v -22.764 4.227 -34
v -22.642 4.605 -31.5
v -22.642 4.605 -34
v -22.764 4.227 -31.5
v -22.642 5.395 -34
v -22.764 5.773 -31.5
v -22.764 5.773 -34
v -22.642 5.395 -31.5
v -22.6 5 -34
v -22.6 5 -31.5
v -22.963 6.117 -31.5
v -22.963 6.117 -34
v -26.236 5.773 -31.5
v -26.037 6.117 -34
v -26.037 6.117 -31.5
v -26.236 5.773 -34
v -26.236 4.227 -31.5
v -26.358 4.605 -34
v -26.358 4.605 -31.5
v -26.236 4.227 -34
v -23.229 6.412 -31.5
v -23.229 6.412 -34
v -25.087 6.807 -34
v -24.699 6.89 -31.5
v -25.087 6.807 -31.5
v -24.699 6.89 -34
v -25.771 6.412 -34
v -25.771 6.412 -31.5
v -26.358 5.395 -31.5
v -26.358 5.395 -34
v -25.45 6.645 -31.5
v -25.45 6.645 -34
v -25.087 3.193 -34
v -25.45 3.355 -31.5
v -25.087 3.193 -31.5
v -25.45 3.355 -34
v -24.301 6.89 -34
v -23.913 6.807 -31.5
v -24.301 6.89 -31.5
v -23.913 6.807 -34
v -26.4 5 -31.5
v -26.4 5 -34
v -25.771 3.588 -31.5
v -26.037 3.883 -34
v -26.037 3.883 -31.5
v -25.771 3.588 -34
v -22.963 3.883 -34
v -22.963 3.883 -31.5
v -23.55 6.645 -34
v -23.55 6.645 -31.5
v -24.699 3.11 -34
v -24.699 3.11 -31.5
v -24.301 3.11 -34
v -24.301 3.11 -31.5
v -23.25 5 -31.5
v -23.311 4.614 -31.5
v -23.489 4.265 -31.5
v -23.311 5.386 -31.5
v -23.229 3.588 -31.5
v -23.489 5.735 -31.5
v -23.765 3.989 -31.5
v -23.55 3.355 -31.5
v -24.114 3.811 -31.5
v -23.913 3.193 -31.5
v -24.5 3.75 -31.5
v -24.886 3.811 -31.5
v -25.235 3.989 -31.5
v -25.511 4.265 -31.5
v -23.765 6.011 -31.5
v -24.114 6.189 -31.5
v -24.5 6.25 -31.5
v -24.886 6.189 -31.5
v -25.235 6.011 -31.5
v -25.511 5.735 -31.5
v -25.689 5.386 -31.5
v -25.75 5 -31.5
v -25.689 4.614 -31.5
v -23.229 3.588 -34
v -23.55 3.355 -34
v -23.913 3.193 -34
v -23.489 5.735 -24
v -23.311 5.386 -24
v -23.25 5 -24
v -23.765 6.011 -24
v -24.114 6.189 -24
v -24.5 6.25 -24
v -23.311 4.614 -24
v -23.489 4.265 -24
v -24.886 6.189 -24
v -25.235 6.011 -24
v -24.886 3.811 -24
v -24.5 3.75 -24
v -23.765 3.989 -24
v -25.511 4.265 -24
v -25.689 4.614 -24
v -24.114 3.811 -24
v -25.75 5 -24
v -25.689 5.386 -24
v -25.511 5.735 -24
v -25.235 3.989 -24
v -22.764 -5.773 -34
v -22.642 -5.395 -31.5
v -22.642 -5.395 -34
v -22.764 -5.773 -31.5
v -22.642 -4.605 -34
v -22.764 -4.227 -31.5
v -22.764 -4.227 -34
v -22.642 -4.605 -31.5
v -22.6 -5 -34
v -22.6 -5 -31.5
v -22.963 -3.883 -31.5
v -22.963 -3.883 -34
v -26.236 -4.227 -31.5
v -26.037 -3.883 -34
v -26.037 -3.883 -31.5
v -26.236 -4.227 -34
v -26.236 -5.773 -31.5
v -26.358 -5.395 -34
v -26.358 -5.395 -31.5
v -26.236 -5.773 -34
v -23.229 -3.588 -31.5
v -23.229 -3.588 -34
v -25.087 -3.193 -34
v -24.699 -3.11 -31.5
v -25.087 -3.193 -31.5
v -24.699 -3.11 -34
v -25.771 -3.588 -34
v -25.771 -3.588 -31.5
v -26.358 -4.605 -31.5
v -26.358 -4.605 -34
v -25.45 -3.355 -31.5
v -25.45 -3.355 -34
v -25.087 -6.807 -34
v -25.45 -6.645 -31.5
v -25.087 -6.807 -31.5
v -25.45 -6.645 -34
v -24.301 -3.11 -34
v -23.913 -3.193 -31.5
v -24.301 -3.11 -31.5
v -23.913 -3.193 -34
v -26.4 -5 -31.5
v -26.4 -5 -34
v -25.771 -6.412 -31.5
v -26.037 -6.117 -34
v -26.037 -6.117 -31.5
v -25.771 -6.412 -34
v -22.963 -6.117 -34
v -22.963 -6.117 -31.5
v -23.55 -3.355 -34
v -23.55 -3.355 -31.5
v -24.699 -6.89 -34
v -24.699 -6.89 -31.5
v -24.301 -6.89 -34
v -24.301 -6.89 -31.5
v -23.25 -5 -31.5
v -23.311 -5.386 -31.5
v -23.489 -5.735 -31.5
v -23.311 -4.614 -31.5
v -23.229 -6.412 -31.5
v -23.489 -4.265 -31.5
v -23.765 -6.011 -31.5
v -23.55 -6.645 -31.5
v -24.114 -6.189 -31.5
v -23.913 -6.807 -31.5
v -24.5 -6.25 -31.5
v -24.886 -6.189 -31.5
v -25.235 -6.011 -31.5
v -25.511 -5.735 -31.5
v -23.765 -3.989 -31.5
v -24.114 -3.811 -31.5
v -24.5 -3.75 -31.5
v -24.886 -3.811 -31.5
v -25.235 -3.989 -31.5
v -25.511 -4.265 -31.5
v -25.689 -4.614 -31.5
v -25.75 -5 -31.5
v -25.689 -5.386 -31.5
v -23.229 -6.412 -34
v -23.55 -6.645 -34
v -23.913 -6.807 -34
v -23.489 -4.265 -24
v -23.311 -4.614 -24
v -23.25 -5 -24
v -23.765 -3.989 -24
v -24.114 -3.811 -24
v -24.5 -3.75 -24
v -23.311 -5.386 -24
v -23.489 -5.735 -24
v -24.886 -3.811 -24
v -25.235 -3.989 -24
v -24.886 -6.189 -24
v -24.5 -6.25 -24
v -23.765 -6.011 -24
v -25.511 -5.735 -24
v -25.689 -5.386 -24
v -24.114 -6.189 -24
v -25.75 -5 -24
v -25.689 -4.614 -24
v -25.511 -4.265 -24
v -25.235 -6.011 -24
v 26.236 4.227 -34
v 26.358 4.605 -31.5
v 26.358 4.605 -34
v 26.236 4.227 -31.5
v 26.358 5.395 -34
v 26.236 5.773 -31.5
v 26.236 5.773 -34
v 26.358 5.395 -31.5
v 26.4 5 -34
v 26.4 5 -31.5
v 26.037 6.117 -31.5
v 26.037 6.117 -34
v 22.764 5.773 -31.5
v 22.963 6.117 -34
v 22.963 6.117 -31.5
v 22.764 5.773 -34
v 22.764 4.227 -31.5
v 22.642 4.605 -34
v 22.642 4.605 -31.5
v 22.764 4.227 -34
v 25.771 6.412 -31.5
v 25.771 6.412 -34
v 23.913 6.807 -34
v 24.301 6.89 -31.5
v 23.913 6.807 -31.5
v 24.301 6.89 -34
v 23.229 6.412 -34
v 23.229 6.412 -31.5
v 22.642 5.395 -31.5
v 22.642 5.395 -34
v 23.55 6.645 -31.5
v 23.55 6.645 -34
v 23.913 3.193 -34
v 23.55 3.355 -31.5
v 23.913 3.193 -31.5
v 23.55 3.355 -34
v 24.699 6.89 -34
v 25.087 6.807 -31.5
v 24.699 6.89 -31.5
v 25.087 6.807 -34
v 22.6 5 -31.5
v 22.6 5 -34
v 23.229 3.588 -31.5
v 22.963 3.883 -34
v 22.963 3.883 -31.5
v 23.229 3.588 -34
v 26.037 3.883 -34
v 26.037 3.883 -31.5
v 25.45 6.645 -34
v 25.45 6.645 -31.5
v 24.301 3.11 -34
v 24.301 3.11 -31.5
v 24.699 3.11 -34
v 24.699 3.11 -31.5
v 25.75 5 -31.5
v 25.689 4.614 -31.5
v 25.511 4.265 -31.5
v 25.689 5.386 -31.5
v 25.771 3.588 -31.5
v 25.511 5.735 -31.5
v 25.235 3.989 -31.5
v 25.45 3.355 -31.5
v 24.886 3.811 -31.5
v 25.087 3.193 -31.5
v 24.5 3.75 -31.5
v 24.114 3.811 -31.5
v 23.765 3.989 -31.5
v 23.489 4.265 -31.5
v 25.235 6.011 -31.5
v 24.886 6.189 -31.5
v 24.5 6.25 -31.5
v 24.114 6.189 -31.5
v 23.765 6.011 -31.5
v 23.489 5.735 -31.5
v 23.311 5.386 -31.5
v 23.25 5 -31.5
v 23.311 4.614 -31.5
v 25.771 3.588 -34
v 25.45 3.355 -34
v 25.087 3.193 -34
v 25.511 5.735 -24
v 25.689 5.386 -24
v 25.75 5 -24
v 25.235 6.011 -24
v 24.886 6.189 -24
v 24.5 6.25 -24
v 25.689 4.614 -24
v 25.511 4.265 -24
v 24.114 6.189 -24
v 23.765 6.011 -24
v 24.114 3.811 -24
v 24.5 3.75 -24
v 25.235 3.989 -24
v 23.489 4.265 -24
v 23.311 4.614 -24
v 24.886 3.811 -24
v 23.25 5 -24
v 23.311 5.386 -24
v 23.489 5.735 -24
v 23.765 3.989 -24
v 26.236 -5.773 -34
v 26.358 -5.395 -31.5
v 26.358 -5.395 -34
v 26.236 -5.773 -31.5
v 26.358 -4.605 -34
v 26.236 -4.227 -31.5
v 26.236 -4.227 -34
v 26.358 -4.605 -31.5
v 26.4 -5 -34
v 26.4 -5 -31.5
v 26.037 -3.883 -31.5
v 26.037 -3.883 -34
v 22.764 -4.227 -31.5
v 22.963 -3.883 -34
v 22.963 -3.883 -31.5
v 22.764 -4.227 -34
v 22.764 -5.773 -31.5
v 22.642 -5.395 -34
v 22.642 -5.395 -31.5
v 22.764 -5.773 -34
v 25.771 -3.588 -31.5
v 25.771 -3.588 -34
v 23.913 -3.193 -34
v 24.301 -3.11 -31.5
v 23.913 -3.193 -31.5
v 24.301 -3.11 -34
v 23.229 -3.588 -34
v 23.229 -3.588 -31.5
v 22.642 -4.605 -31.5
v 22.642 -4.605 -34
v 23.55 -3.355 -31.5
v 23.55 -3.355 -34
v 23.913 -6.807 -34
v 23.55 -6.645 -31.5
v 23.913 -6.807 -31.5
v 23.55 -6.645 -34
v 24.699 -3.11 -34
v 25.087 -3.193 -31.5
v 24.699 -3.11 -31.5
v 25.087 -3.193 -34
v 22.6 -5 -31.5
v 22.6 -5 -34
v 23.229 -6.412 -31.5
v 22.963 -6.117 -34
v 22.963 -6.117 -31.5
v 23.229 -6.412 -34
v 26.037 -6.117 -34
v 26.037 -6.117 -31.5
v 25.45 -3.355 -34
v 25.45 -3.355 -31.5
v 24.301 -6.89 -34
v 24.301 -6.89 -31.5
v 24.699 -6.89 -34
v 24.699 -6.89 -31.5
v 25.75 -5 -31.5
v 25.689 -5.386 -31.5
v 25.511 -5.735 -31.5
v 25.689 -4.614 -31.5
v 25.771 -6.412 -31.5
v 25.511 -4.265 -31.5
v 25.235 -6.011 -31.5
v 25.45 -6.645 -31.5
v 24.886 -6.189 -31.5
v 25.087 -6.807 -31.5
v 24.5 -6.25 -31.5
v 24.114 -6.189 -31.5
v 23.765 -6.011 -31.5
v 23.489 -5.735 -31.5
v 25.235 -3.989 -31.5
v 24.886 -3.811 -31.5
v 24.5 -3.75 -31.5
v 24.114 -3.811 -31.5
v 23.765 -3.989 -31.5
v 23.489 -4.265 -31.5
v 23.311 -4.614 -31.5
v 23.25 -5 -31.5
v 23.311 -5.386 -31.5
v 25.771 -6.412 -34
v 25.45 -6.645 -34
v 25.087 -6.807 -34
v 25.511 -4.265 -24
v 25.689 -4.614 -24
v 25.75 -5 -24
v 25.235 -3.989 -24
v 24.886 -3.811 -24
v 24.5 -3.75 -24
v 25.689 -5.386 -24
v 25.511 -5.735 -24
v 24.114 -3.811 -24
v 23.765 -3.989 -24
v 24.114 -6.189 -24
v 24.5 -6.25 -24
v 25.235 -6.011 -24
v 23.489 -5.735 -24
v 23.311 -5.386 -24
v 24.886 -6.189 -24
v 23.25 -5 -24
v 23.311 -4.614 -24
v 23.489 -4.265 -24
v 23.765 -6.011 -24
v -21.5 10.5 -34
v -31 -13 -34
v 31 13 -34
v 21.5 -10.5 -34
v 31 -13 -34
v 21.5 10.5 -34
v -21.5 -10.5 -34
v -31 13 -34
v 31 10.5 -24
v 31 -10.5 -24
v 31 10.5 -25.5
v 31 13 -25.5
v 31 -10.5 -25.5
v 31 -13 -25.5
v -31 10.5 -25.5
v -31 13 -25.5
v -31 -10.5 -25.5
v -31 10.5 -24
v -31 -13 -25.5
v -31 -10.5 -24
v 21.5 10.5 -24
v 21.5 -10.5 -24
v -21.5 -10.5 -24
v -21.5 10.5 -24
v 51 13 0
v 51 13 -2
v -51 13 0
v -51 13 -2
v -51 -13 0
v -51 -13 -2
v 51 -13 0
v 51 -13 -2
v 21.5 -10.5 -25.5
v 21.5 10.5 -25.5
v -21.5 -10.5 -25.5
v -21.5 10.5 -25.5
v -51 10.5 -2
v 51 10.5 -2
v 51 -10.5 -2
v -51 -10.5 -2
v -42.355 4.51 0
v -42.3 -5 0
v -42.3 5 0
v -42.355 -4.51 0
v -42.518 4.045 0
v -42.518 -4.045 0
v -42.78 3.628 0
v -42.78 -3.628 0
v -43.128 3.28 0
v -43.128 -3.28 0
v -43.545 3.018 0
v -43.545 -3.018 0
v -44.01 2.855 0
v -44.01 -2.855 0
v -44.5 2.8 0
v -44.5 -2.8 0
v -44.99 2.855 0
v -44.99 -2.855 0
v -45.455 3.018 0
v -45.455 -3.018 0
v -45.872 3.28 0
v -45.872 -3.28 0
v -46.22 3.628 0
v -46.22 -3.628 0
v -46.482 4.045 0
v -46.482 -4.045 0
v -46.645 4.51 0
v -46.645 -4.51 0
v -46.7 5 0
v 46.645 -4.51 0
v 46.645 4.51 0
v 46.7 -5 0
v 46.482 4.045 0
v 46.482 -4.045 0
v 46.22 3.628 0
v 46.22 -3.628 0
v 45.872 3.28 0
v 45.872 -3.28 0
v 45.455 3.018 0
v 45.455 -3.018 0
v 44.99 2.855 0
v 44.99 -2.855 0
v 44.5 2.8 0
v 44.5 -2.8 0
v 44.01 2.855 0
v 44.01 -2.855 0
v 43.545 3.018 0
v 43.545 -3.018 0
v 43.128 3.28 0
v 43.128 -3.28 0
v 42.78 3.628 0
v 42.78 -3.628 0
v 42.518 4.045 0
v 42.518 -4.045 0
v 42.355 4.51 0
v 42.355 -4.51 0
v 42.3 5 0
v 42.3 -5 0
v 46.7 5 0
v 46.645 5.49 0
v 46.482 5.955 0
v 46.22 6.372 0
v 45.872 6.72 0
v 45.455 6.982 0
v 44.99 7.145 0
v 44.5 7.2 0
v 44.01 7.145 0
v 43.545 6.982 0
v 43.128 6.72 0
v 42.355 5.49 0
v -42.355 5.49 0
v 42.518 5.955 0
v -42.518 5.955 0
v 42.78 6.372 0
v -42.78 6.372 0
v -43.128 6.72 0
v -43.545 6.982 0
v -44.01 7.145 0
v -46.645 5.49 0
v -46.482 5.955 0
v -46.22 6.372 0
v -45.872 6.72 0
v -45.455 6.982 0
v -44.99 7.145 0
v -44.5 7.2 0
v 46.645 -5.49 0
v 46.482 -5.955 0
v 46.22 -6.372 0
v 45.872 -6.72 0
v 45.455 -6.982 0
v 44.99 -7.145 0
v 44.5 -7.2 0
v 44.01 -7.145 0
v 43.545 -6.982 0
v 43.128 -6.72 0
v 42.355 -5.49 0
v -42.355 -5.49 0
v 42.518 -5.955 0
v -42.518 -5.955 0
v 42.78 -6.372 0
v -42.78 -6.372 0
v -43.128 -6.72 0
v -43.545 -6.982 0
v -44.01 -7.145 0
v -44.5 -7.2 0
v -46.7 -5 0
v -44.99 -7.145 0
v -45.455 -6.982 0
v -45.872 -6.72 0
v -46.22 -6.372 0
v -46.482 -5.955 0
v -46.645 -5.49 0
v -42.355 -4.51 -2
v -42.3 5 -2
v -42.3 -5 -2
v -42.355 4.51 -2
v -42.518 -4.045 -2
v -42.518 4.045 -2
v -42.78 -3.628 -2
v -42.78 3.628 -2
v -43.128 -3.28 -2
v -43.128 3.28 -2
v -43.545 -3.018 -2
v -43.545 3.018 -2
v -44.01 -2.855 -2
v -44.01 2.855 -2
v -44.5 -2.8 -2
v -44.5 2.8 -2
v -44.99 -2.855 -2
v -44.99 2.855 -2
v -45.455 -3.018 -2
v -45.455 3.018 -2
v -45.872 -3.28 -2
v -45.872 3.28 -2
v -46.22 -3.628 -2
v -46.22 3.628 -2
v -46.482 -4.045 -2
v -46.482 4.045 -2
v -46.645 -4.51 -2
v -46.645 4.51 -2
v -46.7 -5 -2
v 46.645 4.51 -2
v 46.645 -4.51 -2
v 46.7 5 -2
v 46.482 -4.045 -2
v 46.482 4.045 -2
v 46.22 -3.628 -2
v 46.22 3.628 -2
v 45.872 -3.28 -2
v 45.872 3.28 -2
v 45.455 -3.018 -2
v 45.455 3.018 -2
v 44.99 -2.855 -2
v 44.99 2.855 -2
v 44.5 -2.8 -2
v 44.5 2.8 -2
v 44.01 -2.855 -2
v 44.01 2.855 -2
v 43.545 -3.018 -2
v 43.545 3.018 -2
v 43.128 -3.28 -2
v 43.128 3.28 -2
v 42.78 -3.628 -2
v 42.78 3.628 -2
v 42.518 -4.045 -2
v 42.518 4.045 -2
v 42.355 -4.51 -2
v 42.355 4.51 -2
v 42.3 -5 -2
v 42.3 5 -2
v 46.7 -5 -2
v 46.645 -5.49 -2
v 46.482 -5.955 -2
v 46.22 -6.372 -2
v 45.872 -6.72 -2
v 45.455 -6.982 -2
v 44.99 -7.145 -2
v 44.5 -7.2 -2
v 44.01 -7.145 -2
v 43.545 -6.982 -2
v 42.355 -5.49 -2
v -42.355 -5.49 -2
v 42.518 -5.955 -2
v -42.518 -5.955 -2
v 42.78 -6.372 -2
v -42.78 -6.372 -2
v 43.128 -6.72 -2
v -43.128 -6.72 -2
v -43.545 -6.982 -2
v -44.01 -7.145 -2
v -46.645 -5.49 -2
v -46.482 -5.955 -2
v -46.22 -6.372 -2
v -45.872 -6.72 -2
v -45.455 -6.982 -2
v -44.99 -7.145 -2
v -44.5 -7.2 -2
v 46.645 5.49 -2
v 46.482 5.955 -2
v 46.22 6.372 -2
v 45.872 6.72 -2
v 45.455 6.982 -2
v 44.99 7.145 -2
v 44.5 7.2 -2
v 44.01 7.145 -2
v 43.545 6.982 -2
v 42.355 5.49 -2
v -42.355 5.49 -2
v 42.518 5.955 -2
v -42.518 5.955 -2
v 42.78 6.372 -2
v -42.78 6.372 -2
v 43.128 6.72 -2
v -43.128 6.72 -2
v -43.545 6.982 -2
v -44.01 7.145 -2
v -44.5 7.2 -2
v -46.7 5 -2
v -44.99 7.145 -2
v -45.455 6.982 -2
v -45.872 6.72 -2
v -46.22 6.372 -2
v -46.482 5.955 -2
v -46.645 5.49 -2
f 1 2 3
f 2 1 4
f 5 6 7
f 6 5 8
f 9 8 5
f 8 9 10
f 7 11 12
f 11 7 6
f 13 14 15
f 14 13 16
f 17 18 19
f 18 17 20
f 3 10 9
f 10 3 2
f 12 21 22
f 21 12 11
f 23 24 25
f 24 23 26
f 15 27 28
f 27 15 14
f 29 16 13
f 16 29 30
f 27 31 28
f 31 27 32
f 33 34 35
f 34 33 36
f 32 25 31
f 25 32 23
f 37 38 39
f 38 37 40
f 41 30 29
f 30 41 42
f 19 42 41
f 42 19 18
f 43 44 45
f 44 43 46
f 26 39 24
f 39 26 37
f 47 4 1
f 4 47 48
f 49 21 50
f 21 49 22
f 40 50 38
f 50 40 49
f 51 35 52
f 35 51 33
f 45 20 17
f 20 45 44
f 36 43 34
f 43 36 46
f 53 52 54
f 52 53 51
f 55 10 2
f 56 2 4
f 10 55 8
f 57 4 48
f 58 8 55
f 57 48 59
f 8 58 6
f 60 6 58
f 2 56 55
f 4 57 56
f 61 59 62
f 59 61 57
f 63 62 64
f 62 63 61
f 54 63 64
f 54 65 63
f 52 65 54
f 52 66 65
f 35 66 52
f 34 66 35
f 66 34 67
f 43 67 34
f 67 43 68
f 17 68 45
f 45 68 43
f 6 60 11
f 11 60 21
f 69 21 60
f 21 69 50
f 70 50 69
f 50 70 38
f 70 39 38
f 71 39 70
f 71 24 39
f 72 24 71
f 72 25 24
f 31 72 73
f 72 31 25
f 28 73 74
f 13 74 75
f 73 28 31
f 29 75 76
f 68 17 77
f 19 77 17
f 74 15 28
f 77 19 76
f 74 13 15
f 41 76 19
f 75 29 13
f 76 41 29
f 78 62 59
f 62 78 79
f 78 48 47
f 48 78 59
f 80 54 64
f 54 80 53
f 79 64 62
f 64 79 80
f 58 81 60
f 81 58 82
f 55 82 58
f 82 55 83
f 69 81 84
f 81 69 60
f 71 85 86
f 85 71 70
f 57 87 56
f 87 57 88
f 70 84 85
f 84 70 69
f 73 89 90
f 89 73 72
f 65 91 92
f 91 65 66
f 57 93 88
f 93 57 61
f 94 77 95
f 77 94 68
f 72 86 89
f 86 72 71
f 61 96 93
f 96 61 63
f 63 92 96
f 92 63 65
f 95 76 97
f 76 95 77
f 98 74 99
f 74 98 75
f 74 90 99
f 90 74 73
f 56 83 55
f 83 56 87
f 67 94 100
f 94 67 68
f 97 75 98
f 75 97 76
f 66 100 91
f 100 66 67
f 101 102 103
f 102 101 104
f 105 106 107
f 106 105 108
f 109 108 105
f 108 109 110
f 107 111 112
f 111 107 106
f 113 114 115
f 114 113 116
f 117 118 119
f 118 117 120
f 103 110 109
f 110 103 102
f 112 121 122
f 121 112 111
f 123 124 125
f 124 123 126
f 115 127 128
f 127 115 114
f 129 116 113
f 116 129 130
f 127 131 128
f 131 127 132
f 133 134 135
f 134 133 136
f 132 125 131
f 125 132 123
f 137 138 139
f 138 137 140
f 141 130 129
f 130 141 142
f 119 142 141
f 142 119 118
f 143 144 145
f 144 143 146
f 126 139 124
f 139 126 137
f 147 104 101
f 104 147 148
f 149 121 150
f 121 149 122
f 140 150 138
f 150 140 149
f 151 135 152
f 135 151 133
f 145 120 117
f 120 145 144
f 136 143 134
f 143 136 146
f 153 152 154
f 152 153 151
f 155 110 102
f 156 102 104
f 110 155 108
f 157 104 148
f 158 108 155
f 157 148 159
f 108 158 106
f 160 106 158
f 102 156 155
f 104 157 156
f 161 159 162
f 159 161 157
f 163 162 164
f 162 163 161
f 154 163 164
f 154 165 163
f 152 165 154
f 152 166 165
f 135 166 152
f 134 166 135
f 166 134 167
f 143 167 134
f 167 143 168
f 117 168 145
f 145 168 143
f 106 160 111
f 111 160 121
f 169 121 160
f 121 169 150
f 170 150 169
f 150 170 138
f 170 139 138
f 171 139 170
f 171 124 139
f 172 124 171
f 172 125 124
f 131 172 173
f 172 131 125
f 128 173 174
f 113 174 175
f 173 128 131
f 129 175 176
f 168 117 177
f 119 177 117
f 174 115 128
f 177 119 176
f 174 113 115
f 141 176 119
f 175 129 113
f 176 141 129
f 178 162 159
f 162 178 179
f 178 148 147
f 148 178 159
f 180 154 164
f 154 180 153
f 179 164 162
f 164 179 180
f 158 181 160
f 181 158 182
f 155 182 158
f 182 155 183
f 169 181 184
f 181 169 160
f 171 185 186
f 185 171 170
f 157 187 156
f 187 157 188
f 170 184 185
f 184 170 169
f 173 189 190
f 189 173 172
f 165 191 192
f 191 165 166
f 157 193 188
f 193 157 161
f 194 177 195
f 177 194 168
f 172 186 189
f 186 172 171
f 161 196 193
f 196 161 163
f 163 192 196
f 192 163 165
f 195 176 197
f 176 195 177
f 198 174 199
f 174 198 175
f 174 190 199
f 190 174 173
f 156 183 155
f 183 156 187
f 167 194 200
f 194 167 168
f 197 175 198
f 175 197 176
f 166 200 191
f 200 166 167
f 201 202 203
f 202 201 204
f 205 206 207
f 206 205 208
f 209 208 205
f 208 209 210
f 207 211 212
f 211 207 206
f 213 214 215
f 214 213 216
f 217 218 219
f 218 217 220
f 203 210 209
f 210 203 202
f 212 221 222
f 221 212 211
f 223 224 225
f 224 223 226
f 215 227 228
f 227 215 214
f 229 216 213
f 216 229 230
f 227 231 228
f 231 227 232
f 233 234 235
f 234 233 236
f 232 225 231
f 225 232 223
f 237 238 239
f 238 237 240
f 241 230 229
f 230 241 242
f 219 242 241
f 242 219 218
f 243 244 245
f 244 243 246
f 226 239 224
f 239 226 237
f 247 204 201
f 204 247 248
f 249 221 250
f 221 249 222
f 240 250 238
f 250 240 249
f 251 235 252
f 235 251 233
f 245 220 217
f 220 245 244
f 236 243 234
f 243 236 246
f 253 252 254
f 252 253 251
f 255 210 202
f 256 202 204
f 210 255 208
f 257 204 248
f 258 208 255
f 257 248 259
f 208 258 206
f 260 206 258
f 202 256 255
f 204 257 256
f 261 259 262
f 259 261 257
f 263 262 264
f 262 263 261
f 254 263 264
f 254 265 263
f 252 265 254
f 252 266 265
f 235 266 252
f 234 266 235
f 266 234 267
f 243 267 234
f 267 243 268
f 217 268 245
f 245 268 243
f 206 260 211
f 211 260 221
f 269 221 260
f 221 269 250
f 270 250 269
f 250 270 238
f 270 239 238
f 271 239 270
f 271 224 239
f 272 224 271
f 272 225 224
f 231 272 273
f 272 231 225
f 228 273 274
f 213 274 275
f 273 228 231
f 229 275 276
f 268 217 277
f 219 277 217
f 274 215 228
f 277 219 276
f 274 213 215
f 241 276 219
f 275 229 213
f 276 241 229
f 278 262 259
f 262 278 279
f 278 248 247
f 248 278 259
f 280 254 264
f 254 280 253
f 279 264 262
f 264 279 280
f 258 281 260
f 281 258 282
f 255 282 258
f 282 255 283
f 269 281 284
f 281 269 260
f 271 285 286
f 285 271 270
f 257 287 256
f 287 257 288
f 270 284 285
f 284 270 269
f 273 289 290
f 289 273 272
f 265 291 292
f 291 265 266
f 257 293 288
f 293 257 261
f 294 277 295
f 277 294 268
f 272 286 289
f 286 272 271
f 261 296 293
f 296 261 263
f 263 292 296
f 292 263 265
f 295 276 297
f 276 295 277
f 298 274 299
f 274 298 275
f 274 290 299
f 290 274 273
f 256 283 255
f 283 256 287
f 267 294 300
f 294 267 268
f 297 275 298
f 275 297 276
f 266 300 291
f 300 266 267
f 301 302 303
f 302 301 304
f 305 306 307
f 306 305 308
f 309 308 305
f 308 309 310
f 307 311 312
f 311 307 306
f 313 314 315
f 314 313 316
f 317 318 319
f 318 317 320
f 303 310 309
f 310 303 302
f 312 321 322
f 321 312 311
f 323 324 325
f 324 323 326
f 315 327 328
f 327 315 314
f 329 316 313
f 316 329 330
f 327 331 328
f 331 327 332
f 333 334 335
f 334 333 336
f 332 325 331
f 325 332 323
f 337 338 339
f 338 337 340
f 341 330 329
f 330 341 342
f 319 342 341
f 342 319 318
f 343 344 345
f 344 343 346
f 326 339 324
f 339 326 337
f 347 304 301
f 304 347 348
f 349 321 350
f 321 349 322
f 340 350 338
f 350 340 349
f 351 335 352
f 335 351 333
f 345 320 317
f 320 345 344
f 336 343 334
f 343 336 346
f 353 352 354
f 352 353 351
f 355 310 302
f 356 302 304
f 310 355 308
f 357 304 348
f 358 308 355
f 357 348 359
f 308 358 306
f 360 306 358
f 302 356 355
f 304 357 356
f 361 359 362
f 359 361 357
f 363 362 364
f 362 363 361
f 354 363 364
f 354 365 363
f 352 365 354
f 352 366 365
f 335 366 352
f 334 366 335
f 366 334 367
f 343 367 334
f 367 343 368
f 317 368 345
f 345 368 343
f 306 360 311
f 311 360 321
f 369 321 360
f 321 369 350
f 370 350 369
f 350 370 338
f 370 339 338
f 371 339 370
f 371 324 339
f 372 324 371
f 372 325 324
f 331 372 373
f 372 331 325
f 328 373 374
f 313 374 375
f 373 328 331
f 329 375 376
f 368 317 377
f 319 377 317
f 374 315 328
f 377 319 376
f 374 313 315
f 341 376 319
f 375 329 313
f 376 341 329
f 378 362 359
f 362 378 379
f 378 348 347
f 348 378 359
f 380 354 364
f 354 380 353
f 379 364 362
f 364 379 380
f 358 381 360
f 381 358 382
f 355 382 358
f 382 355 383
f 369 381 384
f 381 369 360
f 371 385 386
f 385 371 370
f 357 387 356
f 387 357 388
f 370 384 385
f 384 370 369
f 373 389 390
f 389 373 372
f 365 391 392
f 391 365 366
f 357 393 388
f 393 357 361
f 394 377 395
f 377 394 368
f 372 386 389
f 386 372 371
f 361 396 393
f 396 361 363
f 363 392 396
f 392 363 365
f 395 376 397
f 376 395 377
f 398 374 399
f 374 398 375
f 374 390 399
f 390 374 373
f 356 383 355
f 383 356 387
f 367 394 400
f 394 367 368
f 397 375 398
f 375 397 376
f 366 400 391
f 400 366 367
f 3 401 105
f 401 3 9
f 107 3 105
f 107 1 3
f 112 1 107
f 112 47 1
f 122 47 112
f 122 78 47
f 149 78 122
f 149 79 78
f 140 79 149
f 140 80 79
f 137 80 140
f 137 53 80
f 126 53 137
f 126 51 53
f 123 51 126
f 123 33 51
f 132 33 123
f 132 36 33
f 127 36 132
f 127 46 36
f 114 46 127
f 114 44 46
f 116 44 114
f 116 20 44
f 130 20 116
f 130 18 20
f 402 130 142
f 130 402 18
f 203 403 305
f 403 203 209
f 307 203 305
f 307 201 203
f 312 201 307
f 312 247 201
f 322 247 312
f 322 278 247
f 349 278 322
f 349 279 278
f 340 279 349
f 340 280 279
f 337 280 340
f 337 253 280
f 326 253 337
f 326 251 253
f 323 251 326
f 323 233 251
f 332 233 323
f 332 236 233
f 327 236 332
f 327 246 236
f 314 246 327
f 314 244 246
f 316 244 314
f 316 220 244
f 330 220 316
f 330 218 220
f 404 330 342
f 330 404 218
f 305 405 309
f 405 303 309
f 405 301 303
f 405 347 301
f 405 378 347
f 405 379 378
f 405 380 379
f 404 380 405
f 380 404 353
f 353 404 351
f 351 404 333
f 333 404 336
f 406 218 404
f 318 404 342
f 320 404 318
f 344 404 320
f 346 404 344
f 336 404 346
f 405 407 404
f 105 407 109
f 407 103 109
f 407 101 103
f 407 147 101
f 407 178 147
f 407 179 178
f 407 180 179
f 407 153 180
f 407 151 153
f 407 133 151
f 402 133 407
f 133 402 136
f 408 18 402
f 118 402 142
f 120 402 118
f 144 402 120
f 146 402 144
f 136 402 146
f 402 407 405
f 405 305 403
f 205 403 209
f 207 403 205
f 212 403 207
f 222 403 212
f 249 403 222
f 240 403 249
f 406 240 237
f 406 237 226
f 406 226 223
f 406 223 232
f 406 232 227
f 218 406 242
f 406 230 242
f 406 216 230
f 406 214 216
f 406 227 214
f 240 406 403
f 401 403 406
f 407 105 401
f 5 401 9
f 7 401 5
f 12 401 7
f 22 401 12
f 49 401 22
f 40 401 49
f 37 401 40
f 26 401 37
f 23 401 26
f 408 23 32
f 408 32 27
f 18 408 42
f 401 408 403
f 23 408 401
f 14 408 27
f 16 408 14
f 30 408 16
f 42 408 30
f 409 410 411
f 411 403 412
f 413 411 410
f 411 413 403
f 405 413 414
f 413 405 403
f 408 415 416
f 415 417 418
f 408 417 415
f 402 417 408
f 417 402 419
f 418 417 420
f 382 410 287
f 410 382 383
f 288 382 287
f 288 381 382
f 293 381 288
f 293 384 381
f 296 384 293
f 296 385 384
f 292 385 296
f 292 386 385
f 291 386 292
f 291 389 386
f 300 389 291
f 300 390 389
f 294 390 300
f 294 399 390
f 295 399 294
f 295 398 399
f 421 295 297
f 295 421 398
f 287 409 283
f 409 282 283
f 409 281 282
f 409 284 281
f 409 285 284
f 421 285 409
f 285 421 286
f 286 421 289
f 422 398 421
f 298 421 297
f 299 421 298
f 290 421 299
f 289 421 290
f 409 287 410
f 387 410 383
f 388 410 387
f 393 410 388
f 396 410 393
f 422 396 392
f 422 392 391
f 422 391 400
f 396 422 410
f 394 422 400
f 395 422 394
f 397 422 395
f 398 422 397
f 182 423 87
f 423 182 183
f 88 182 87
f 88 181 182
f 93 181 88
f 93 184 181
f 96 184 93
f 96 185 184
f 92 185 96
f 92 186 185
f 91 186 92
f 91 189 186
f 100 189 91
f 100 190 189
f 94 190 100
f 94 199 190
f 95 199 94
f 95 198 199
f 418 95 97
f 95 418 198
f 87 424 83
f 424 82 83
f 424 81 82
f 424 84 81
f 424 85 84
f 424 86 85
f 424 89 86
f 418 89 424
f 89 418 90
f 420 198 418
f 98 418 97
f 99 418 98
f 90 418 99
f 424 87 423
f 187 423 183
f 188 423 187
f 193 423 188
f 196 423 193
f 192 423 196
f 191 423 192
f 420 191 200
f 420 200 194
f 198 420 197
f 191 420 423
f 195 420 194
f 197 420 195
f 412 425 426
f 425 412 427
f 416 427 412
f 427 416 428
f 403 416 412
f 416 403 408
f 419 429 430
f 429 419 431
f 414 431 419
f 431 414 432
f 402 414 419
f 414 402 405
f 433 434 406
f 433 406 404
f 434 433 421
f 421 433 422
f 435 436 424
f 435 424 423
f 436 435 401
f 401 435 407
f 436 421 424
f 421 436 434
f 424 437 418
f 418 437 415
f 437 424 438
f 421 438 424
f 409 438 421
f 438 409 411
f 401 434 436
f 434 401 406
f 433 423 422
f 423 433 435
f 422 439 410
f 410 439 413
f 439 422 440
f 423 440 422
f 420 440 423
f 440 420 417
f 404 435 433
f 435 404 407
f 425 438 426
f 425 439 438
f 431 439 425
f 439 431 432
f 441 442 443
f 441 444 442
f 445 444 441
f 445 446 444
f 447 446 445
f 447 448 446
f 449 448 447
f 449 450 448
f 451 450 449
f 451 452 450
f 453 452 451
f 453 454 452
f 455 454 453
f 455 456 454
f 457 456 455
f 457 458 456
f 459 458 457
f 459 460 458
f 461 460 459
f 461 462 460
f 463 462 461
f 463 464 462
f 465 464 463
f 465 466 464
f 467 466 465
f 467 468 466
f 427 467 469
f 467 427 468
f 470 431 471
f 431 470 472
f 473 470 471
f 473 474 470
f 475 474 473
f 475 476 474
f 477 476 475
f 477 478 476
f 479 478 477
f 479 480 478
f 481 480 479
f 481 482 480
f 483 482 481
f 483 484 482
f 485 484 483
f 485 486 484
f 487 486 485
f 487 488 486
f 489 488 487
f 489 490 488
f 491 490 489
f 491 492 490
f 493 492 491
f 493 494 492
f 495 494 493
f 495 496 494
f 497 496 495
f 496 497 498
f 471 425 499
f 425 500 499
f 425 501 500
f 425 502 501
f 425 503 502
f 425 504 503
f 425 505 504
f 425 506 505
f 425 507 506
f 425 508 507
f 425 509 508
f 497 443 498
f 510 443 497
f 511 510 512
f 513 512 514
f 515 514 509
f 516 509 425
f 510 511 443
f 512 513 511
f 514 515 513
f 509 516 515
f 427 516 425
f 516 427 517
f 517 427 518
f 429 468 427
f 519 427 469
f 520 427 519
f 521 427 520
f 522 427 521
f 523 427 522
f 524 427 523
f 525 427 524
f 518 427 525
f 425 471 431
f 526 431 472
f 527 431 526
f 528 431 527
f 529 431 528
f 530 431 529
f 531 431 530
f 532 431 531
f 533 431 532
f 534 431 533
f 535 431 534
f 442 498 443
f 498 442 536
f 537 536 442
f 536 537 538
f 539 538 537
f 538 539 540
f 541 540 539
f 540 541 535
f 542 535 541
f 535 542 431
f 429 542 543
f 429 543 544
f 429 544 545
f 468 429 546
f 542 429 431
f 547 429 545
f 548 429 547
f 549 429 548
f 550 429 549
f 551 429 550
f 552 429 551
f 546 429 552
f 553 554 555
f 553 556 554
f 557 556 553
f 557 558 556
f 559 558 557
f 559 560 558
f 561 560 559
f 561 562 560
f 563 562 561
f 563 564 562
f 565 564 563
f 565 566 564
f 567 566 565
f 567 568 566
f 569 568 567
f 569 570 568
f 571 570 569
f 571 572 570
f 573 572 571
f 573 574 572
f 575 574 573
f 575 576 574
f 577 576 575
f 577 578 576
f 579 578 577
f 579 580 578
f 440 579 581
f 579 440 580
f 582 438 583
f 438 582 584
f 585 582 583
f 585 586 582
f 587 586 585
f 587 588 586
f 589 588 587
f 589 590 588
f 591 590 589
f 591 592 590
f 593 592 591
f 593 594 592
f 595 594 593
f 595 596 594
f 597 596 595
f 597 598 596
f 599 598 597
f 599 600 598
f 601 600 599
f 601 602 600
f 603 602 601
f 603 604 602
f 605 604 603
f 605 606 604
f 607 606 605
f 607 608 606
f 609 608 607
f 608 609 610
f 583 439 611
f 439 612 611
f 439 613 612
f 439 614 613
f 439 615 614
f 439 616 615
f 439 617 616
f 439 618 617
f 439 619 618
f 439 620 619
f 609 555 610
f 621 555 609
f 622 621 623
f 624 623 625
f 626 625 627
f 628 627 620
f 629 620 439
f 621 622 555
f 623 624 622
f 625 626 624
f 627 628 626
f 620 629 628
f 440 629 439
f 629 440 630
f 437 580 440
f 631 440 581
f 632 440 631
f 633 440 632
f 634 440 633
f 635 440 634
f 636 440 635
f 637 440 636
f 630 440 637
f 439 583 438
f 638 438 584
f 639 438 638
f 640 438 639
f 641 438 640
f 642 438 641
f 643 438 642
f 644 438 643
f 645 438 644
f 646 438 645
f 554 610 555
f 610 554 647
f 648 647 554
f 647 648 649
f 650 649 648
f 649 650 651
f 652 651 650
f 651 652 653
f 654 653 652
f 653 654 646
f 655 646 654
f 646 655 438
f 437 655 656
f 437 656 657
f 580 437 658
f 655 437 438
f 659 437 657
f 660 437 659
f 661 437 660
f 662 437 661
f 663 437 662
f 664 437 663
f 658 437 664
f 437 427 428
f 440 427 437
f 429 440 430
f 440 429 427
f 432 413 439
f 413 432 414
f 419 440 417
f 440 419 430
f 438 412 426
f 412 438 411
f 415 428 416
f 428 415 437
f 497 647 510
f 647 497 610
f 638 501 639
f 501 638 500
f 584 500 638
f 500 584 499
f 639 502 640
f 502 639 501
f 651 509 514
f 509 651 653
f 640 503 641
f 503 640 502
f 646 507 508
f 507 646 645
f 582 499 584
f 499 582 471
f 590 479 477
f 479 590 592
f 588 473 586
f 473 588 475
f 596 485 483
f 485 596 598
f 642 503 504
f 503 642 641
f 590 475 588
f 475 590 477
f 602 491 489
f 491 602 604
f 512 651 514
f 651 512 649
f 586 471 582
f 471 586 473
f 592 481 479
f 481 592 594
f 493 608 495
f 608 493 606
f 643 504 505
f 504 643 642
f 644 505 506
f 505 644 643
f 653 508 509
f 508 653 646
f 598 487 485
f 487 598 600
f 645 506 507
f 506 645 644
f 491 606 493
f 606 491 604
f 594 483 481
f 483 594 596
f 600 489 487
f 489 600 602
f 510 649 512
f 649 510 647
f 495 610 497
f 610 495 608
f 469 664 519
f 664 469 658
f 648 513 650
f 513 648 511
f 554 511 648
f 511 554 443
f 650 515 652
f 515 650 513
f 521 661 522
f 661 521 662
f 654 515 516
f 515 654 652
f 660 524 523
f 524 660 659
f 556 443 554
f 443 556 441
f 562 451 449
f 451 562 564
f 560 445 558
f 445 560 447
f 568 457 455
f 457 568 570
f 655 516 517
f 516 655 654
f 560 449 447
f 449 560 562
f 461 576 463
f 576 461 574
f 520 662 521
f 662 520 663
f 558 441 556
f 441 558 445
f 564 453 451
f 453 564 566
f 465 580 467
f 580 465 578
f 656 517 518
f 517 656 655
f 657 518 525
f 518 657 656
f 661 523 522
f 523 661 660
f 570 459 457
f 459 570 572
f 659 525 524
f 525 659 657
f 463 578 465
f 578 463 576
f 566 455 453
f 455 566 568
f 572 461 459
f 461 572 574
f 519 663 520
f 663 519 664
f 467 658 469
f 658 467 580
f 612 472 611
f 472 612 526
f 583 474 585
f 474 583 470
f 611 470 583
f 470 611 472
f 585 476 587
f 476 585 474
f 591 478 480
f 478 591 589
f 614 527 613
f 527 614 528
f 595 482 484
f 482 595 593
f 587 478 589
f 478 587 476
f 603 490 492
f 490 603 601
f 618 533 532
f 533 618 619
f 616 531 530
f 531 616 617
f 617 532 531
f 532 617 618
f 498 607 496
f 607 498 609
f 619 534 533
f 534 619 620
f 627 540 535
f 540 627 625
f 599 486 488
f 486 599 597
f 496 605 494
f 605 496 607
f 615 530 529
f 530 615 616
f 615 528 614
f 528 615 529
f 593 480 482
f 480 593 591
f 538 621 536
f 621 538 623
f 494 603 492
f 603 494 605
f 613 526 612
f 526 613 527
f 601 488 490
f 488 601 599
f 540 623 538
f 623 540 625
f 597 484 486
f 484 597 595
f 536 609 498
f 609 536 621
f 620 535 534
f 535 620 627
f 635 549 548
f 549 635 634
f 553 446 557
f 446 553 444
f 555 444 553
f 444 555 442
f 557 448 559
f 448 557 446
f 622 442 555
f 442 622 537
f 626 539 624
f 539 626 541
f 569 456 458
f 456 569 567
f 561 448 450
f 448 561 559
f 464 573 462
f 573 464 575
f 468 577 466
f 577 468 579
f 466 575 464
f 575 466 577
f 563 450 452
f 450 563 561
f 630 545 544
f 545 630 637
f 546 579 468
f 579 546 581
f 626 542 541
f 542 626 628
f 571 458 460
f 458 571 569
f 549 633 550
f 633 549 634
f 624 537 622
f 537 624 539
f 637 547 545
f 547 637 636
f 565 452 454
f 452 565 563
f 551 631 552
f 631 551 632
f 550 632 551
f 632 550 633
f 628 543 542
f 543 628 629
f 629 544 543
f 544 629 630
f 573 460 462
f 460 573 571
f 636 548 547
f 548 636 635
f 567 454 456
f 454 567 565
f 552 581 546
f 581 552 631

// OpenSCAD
// file: config.scad
$fs=0.5;

di_m4_t = 3.6;
di_m4_d = 4.4;

di_m4_nut = 8.5;

di_m2_t = 1.8;
// main file
include <config.scad>

module top() {
    difference() {
        union() {
            translate([0, 0, -1])
            cube([102, 26, 2], center=true);
            
            translate([0, 0, -12-22])
            rotate([0, 90, 0]) 
            motor_mount();
            
            hull() {
                translate([0, -11.75, -25])
                cube([62, 2.5, 1], center=true);
                translate([0, -11.75, -1])
                cube([102, 2.5, 2], center=true);
            }
            
            hull() {
                translate([0, 11.75, -25])
                cube([62, 2.5, 1], center=true);
                translate([0, 11.75, -1])
                cube([102, 2.5, 2], center=true);
            }
        }
        translate([44.5, 5, 0])
        cylinder(d=di_m4_d, h=10, center=true);
        translate([-44.5, 5, 0])
        cylinder(d=di_m4_d, h=10, center=true);
        translate([44.5, -5, 0])
        cylinder(d=di_m4_d, h=10, center=true);
        translate([-44.5, -5, 0])
        cylinder(d=di_m4_d, h=10, center=true);
    }
}

module motor_mount() {
    difference() {
        union() {
            translate([-5, 0, 0])
            cube([10, 21+5, 62], center=true);
        }
        translate([-5, 0, 0])
        cube([11, 21, 43], center=true);
        
        translate([1, 5, -24.5])
        rotate([0, -90, 0]) {
            cylinder(d = 3.8, h = 3.5, $fs=0.4);
            cylinder(d = 2.5, h = 14, $fs=0.4);
        }
        translate([1, -5, -24.5])
        rotate([0, -90, 0]) {
            cylinder(d = 3.8, h = 3.5, $fs=0.4);
            cylinder(d = 2.5, h = 14, $fs=0.4);
        }
        translate([1, 5, 24.5])
        rotate([0, -90, 0]) {
            cylinder(d = 3.8, h = 3.5, $fs=0.4);
            cylinder(d = 2.5, h = 14, $fs=0.4);
        }
        translate([1, -5, 24.5])
        rotate([0, -90, 0]) {
            cylinder(d = 3.8, h = 3.5, $fs=0.4);
            cylinder(d = 2.5, h = 14, $fs=0.4);
        }
    }
}
//motor_mount();
top();
